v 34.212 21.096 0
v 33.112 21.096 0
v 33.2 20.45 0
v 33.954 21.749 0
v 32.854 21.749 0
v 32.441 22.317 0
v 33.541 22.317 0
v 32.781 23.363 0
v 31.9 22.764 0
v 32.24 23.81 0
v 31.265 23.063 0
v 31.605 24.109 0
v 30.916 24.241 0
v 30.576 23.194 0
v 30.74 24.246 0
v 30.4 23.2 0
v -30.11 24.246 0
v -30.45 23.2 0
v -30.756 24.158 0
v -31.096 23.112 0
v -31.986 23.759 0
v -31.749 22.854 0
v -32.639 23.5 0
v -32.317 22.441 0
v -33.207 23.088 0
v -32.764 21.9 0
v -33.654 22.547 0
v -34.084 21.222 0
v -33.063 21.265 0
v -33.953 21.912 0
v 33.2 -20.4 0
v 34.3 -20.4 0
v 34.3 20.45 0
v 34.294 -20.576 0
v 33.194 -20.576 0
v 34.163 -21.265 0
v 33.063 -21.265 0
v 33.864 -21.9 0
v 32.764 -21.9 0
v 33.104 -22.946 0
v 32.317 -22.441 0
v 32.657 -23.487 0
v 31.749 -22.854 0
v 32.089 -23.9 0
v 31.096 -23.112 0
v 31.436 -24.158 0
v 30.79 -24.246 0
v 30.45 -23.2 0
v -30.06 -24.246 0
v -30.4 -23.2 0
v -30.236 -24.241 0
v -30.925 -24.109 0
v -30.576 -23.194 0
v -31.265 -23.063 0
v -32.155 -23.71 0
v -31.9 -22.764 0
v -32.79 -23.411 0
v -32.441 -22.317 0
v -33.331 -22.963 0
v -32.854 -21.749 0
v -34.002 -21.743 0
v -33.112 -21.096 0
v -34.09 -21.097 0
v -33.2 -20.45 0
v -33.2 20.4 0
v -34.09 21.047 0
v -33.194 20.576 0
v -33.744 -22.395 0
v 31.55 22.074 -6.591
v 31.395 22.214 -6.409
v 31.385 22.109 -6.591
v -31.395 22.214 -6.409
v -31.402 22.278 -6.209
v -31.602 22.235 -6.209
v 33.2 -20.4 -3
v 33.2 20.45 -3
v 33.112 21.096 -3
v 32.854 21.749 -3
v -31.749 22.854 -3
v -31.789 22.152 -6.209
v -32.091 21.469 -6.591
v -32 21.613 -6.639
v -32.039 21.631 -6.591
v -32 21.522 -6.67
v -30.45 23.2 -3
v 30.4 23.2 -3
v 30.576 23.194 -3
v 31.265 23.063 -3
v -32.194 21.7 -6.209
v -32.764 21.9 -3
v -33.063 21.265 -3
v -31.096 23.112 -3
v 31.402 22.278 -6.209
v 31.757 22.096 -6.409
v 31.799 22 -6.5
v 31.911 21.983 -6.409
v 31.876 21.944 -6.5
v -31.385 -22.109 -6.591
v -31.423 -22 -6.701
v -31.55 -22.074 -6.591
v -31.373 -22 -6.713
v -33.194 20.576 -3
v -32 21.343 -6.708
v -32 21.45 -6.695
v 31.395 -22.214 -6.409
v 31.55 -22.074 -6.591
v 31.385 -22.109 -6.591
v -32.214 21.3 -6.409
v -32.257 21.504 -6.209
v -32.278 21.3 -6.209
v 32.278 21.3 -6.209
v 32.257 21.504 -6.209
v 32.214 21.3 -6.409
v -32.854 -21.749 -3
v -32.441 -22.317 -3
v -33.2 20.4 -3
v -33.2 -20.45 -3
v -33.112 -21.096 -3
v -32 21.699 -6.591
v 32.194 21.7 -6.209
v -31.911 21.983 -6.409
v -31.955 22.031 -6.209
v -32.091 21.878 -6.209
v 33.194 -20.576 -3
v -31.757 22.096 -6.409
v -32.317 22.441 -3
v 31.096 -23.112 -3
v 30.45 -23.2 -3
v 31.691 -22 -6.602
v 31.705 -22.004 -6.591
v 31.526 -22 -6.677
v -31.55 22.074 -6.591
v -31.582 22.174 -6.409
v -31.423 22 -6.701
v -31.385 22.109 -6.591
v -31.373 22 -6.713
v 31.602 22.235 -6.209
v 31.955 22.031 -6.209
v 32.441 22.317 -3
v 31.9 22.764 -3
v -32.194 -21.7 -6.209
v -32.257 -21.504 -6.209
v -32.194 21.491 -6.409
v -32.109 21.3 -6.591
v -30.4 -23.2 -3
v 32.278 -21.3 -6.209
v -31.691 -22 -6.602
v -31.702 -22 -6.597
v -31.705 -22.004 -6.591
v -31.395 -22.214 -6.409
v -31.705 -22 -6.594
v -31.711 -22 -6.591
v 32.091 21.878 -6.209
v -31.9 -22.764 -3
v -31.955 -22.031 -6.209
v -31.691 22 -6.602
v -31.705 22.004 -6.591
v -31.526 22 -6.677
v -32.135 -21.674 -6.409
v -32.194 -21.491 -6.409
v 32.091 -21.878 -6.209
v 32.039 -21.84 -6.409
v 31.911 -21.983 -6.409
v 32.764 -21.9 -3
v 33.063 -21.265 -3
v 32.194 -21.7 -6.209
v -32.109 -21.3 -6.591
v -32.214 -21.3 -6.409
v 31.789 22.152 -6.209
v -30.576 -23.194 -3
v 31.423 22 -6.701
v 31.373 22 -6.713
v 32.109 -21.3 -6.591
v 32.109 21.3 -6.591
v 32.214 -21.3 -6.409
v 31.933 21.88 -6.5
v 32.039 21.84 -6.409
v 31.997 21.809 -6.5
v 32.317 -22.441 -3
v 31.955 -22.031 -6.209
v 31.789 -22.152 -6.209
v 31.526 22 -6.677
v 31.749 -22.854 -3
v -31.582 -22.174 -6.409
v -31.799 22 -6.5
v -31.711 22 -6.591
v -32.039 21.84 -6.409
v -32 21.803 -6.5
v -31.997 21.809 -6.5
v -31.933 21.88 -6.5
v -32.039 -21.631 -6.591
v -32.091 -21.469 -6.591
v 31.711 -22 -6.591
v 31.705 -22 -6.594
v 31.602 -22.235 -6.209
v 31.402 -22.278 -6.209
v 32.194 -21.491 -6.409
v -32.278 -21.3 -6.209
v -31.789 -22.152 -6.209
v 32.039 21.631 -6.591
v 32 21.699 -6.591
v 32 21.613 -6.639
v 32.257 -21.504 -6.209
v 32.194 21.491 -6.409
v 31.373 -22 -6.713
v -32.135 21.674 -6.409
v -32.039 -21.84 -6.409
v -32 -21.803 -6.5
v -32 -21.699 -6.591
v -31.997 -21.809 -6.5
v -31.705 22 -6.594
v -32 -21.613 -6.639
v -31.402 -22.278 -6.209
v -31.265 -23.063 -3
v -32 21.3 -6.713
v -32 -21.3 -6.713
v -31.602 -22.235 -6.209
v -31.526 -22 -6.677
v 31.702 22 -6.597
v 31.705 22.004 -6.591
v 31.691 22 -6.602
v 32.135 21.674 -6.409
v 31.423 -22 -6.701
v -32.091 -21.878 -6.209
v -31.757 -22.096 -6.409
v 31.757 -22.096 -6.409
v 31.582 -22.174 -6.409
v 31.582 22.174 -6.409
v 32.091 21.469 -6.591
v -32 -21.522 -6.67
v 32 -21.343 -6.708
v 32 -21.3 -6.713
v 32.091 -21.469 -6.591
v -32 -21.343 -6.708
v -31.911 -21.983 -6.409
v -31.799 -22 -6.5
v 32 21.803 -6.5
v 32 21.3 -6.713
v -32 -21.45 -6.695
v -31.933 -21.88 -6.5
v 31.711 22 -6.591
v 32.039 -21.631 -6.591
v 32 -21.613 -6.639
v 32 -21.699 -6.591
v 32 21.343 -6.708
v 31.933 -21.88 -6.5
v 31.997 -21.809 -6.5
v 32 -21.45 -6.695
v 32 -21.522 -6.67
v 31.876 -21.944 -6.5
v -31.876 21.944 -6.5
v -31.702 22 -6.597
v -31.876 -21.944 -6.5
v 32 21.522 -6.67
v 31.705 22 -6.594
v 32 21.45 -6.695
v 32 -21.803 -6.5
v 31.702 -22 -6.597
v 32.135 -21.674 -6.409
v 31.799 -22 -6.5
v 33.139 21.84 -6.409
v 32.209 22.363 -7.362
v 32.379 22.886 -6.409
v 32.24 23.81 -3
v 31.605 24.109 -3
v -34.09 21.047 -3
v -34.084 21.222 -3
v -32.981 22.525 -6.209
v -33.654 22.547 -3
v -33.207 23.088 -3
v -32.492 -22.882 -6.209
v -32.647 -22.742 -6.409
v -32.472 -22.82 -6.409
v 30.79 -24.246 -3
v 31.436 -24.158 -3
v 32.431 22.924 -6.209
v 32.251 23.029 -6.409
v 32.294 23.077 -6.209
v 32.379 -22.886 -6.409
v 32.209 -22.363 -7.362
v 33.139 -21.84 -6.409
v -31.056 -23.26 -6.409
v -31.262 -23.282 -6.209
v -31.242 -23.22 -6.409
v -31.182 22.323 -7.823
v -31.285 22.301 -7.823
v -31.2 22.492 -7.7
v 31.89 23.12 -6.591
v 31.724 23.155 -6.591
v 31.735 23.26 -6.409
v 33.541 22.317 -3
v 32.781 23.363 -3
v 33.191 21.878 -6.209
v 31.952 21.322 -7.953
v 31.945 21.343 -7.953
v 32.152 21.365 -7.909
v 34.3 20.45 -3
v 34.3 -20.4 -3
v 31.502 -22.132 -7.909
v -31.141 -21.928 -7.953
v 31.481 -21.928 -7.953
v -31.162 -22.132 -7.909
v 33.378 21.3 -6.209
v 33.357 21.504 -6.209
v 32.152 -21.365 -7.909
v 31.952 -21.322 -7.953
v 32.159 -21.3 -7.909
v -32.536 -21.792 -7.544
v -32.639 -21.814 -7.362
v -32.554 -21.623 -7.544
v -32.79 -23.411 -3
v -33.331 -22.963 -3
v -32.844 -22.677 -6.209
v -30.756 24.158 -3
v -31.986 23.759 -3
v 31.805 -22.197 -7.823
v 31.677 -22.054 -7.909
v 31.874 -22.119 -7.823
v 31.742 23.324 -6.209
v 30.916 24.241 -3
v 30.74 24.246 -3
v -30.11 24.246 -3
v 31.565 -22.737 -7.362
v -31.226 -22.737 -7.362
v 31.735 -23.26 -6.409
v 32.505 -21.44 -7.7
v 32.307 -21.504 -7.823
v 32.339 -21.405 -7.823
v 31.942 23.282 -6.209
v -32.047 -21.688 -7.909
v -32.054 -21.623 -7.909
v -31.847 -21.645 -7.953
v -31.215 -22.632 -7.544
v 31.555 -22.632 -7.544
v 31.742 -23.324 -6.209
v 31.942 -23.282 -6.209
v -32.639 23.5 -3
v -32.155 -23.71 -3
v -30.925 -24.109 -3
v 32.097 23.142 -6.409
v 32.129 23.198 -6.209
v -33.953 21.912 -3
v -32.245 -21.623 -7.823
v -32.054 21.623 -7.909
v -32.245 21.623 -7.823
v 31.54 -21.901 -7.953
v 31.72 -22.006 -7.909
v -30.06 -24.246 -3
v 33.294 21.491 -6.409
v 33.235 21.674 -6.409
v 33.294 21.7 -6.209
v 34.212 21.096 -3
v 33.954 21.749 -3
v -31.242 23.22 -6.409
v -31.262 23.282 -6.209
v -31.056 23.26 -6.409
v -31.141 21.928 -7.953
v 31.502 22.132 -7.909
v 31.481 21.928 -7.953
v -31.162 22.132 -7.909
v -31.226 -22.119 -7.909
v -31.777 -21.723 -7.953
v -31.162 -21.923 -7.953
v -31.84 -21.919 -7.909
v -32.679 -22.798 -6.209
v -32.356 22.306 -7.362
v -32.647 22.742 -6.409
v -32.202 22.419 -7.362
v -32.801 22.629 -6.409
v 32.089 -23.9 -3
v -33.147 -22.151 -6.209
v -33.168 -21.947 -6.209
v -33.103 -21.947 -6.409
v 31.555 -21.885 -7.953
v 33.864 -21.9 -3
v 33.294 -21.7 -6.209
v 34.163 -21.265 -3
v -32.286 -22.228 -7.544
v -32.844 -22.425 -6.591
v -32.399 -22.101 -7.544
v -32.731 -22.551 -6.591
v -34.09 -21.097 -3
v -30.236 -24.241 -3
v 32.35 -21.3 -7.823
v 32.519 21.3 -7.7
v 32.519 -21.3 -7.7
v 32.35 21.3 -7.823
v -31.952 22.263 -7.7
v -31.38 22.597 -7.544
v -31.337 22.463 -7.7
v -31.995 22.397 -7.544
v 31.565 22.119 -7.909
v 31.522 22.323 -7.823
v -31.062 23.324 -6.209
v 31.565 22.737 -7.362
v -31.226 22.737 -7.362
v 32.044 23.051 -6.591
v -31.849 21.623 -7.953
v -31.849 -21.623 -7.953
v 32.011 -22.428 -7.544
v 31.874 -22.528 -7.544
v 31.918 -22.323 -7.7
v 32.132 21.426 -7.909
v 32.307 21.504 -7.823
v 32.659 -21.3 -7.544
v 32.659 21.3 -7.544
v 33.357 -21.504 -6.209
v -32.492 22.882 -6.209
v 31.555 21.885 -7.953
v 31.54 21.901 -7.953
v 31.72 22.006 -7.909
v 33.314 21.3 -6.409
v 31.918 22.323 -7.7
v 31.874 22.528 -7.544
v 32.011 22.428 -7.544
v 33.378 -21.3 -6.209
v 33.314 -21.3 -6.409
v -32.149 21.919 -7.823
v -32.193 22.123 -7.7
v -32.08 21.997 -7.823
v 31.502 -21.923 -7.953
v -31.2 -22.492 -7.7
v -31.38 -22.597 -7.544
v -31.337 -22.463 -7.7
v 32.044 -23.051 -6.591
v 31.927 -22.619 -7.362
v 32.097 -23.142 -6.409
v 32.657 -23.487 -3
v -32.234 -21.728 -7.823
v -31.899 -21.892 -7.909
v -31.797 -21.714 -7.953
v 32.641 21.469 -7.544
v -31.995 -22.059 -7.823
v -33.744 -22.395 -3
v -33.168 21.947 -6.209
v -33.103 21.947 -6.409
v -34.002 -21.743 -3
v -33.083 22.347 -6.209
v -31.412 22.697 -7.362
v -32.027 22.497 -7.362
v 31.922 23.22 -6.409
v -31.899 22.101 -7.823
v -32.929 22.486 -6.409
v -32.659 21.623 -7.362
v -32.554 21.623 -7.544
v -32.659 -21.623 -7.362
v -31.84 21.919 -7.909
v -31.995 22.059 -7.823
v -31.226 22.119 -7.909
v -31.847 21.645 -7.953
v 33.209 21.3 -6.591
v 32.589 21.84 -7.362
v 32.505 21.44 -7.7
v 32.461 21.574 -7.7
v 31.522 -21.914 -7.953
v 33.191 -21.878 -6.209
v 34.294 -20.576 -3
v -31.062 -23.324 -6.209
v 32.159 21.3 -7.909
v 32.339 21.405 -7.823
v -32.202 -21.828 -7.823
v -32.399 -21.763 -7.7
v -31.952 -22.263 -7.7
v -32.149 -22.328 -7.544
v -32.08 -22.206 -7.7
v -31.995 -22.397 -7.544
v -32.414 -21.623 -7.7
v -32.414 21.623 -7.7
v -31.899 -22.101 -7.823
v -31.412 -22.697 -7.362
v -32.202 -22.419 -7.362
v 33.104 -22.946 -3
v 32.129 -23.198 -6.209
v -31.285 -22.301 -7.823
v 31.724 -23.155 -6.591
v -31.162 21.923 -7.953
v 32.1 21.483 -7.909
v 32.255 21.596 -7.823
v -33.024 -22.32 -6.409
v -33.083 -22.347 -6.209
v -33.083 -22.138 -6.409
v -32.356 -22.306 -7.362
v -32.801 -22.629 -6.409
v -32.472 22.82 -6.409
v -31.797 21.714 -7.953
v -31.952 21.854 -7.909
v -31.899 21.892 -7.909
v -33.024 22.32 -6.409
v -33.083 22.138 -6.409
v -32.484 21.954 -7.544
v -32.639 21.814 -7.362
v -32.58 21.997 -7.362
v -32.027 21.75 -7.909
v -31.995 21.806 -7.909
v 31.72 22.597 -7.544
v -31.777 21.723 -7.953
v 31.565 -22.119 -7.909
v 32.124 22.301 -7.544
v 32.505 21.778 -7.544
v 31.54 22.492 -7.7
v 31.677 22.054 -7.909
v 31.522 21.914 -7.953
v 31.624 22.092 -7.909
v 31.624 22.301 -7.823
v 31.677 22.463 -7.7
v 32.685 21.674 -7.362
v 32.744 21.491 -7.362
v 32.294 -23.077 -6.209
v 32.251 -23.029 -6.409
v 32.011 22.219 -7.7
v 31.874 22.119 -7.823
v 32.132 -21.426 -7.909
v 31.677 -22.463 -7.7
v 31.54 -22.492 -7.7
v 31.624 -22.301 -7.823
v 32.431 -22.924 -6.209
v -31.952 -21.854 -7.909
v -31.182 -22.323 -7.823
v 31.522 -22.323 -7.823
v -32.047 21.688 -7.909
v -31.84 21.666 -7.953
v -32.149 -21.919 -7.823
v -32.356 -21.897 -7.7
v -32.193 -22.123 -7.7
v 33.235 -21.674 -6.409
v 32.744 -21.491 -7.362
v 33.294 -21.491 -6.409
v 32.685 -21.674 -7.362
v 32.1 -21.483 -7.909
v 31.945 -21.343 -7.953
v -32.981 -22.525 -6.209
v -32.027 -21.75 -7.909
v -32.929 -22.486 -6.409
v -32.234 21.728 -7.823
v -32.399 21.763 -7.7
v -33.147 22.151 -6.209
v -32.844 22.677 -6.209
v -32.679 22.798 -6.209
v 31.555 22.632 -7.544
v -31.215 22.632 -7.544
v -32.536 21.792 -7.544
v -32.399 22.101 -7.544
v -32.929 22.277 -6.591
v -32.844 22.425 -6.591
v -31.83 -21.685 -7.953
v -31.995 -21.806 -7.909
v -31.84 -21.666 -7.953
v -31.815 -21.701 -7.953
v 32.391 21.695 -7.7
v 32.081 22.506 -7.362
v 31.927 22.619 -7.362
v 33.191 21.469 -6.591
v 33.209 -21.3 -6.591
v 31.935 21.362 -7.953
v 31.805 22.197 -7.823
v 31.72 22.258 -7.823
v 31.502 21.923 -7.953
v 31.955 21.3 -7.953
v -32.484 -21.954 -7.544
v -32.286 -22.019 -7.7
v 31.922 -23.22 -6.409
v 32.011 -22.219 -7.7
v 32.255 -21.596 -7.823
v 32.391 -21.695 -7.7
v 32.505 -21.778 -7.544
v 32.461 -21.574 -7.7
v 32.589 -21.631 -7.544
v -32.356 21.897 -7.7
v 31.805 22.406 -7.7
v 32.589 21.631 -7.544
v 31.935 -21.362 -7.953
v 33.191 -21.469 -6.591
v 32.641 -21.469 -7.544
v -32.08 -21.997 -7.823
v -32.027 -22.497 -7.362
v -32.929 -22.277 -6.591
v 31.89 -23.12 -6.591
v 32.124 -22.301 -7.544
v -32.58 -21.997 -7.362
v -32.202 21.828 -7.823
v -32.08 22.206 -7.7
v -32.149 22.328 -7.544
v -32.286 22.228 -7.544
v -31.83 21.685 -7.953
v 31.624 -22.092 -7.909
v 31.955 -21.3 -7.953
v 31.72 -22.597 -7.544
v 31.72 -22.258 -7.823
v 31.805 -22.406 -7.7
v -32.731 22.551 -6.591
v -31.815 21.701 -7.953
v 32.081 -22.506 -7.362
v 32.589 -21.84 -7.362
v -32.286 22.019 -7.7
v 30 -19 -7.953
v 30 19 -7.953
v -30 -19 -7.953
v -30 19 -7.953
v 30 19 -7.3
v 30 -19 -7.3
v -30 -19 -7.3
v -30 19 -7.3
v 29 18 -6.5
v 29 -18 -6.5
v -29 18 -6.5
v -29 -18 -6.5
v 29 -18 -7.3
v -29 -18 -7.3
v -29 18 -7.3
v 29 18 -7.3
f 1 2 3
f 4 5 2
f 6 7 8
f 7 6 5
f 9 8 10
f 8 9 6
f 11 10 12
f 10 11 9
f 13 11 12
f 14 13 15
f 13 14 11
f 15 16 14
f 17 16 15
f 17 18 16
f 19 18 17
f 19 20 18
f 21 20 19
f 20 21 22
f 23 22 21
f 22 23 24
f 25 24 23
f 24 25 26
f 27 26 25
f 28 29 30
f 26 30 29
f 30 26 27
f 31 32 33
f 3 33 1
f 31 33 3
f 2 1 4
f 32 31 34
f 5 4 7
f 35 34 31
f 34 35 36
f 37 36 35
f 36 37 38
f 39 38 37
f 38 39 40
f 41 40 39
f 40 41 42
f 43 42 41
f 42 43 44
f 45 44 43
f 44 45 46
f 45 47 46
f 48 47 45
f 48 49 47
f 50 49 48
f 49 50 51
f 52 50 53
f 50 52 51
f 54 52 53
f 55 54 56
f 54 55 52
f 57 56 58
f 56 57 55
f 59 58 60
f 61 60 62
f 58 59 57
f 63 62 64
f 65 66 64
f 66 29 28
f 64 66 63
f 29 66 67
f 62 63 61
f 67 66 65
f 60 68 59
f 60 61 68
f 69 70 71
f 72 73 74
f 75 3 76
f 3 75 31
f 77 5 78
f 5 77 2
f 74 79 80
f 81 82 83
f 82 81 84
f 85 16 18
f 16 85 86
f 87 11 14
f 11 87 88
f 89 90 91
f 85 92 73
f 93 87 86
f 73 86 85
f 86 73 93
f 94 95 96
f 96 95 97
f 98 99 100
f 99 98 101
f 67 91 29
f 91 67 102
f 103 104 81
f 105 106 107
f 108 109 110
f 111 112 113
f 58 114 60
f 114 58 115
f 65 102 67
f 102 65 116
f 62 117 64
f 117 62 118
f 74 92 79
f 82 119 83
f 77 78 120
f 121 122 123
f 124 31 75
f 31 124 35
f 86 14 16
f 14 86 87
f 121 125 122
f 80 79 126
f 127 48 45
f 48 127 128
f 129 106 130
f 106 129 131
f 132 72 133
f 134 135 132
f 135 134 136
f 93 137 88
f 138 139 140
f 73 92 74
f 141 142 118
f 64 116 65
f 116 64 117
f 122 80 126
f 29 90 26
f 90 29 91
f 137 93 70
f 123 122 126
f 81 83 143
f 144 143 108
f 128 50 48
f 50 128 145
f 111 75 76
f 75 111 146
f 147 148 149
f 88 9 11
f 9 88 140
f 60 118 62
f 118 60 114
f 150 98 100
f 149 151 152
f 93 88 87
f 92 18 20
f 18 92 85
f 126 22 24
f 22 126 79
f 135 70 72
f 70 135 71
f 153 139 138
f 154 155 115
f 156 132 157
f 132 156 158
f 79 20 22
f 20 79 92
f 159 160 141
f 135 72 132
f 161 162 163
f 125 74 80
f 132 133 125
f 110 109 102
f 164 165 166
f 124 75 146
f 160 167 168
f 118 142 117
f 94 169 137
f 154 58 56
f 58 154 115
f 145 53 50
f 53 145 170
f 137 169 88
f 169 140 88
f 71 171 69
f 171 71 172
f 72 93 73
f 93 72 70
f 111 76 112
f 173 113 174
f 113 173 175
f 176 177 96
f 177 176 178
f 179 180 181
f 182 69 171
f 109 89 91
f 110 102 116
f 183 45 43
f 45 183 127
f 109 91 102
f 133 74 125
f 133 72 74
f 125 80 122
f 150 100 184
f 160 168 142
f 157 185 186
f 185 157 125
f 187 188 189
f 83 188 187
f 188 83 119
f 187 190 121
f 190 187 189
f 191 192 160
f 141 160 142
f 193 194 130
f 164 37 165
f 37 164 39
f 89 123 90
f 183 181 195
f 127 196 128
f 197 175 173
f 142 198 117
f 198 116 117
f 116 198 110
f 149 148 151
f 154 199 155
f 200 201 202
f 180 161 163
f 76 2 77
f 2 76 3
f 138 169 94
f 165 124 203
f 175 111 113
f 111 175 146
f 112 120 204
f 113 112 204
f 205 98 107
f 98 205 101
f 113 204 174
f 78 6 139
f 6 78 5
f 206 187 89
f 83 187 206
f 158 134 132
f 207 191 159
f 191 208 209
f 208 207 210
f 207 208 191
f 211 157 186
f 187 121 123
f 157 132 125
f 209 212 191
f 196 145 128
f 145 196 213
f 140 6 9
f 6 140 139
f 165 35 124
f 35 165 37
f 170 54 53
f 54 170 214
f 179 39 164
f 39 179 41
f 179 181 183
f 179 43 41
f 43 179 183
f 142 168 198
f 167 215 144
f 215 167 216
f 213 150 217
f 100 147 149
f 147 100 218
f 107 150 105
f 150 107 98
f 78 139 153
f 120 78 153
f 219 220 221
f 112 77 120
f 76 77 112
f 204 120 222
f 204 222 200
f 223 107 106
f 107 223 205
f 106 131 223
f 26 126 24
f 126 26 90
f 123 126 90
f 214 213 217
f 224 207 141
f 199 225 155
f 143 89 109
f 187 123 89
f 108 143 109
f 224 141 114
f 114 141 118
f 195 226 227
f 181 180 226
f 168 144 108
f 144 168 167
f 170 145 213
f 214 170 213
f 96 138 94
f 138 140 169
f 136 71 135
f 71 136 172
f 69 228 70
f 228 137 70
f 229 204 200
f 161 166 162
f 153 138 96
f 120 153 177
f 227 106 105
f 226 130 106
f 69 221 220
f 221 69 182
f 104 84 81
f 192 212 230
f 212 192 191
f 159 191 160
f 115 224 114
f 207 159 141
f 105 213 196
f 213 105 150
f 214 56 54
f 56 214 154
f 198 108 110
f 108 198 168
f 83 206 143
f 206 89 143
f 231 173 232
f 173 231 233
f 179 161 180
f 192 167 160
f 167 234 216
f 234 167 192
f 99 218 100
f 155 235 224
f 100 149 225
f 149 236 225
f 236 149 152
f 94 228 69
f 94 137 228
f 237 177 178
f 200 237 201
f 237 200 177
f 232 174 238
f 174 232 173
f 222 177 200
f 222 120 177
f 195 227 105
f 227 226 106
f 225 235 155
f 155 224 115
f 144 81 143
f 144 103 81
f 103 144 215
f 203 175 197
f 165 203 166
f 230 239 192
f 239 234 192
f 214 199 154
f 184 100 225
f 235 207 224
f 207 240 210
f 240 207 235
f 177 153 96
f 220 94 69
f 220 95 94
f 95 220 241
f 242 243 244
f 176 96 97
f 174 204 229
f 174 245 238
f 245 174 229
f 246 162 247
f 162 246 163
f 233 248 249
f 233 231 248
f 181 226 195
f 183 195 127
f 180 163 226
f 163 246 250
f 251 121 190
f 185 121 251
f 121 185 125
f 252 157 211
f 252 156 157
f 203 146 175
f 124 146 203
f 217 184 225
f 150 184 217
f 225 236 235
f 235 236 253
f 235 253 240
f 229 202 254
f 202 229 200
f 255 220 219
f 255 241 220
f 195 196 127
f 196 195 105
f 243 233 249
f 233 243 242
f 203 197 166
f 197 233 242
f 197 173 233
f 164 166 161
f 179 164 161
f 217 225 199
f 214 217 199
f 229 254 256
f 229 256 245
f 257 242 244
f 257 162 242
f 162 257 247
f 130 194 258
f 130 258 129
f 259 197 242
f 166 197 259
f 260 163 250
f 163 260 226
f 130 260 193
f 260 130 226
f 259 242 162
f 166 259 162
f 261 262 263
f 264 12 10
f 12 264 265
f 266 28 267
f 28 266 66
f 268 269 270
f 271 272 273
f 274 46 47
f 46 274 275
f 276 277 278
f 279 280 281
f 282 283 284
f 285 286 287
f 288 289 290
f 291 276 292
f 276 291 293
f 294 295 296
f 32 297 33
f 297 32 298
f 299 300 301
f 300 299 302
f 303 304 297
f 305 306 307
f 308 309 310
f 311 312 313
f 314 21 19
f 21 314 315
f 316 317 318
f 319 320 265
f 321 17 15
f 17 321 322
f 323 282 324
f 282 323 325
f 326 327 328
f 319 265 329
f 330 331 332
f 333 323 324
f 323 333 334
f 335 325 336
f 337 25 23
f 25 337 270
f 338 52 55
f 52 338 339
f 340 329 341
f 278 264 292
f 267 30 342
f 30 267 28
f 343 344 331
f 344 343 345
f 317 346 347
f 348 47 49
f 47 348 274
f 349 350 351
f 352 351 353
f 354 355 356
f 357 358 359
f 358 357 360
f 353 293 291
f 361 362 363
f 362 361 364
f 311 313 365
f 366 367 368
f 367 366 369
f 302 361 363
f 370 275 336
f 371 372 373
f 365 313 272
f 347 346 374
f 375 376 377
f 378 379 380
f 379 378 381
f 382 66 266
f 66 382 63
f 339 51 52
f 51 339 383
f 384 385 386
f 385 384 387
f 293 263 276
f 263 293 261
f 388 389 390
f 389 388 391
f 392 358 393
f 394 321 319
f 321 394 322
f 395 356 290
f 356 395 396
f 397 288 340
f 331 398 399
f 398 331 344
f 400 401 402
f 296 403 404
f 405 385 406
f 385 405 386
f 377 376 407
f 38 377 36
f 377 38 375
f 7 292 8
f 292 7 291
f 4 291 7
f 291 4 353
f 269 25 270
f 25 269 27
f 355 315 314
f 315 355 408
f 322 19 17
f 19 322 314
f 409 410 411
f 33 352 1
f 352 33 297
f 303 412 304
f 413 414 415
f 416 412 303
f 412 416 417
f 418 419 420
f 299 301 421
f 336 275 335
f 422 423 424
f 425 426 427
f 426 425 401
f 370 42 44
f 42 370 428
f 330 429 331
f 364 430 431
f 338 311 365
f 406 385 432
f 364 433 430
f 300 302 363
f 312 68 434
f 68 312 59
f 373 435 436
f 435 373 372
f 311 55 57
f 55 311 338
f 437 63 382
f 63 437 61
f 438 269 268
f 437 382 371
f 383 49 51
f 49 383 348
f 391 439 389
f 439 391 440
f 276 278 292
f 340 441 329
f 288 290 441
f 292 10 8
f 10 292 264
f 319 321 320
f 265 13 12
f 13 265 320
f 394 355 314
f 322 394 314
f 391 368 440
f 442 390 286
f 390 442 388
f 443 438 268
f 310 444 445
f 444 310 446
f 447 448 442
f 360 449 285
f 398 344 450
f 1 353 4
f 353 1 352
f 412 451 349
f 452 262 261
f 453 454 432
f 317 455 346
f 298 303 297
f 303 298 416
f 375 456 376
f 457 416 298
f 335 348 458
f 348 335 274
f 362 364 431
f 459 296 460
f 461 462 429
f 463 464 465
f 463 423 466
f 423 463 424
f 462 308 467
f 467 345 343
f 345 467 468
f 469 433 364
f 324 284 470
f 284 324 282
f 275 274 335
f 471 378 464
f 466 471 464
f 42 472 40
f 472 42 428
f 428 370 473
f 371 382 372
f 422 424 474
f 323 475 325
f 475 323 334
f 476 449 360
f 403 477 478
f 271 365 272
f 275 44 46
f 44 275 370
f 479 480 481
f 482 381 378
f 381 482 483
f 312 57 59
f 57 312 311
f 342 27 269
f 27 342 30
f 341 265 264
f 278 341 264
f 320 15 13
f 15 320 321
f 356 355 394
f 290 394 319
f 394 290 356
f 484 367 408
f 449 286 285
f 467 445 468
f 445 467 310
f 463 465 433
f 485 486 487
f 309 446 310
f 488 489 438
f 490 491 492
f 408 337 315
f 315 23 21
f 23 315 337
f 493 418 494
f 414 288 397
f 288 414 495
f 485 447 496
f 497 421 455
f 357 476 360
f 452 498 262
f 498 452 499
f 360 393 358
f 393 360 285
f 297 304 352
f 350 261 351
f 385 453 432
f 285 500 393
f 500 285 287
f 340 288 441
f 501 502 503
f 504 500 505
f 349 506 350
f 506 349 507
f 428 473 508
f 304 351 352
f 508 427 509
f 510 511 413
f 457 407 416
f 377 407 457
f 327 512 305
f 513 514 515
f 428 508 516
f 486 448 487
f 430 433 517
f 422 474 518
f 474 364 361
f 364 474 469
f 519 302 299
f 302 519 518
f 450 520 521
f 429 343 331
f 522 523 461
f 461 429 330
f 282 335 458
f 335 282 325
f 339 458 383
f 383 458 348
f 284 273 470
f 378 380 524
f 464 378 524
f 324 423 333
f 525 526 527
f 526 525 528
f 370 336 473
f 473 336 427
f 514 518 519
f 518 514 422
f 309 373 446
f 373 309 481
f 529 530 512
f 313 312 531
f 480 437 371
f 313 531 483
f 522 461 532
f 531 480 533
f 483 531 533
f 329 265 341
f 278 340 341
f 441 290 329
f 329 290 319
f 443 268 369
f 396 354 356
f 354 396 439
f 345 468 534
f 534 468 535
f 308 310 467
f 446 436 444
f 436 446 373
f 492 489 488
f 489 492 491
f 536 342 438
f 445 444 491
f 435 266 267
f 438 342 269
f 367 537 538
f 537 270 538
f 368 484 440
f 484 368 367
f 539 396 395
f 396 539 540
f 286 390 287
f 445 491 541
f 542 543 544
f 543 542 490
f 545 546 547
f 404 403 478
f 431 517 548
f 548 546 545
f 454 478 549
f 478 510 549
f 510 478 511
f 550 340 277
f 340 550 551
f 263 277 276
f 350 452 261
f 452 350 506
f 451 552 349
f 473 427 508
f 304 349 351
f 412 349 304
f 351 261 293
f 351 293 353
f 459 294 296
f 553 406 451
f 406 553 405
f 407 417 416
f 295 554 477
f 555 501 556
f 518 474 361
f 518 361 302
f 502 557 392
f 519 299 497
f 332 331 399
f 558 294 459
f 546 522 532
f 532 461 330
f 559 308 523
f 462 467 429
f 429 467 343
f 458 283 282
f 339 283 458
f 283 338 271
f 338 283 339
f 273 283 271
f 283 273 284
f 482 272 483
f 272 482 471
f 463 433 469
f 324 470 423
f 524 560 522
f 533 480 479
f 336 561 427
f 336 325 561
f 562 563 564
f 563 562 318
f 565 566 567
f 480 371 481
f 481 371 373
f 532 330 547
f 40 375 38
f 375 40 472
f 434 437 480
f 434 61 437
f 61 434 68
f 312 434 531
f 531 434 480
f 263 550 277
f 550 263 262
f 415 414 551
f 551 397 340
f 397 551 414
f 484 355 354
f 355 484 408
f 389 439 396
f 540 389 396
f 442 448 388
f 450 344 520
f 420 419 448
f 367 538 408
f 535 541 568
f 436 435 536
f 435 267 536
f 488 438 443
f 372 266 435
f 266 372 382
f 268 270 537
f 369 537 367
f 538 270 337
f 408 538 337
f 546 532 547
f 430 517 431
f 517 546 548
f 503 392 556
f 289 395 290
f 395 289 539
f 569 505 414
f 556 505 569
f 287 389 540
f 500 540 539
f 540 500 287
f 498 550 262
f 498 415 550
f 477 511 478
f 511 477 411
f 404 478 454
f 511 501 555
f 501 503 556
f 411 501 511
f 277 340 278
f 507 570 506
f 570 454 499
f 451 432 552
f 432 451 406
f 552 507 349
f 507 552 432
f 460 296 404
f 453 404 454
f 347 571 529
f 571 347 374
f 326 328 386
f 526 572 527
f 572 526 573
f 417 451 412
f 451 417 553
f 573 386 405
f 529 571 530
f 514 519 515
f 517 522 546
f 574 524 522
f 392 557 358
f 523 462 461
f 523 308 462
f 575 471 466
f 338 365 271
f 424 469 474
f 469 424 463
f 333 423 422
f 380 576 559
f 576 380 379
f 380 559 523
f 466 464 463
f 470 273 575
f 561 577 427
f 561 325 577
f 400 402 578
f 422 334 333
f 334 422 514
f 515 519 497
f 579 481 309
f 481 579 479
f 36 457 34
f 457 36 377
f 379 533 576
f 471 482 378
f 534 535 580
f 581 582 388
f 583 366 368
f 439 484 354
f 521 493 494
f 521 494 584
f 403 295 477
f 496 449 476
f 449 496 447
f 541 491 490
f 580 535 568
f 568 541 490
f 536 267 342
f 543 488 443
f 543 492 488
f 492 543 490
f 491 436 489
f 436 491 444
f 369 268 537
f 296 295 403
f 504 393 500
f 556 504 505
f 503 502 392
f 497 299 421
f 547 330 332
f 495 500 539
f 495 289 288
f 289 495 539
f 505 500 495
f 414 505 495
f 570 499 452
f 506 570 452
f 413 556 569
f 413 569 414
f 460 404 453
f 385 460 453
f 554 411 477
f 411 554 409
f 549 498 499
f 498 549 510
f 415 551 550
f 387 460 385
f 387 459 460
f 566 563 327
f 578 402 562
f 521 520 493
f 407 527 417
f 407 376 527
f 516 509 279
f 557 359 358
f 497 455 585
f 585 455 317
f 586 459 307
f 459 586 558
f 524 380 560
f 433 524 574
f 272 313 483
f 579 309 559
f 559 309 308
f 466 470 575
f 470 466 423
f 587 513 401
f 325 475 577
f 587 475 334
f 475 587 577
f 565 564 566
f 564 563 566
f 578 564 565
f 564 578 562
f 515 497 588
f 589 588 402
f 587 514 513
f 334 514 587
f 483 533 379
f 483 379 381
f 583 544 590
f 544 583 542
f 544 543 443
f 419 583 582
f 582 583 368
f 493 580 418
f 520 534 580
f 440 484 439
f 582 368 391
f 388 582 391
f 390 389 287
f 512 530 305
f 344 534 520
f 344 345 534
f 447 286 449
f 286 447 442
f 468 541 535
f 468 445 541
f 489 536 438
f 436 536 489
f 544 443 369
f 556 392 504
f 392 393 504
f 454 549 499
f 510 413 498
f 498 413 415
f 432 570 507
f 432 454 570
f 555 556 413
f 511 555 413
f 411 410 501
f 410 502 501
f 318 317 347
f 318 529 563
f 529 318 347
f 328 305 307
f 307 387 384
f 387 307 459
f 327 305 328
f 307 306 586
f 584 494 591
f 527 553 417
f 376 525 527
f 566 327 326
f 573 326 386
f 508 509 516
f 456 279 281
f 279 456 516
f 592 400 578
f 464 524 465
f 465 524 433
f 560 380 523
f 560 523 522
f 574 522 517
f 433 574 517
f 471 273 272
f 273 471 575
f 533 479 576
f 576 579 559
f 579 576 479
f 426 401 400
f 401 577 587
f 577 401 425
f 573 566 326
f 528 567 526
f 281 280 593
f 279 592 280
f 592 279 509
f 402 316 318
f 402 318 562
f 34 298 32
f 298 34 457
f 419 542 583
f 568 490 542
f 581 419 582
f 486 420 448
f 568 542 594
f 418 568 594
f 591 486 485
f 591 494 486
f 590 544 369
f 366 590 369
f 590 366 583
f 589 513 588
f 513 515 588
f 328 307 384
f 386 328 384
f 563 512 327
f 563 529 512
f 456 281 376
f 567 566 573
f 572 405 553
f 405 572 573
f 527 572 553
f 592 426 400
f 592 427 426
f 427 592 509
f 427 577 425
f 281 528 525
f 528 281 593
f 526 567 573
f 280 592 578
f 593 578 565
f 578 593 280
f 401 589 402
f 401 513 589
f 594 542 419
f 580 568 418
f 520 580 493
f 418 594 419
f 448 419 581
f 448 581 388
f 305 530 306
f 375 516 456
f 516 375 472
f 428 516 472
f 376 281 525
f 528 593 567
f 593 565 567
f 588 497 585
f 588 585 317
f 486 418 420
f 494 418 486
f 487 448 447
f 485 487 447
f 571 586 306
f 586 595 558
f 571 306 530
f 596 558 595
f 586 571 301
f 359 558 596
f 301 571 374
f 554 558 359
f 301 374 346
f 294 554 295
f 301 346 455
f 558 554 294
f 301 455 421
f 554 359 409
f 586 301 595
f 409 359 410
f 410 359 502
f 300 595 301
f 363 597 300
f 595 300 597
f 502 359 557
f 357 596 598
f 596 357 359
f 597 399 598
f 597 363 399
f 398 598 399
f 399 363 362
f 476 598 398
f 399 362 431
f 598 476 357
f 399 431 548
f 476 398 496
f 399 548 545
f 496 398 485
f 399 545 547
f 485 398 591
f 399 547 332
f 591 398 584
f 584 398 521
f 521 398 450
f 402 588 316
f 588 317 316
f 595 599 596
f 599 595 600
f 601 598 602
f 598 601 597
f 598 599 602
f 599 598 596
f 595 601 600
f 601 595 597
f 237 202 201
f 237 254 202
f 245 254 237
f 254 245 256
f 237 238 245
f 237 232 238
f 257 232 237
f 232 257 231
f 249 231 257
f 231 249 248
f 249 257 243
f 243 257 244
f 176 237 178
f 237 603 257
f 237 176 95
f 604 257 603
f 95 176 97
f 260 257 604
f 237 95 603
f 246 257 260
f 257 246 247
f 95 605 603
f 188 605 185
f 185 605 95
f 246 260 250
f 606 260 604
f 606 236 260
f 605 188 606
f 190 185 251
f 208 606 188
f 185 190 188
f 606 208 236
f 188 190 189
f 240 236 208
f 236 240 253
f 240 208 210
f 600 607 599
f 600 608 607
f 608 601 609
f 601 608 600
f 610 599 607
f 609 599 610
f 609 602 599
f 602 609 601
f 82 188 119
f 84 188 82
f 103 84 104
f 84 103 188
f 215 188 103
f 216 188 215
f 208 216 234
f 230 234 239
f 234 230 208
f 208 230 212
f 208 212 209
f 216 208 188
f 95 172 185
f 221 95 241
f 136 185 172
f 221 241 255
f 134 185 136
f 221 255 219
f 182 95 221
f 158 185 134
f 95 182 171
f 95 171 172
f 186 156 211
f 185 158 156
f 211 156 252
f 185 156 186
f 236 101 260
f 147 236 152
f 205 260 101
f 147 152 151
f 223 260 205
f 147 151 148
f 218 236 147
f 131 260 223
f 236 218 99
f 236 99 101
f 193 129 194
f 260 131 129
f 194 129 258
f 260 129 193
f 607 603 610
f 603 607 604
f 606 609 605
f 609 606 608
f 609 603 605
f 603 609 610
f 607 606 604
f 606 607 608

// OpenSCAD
epaisseur1=1.4;
radius=epaisseur1;
marge = 0.3;
xc=63;
yc=43;
zecran=6.0;
xb=xc+2*epaisseur1+2*marge;
yb=yc+2*epaisseur1+2*marge;
offset=0.2;
//voffset = .75;
rebord = 3.5;
epaisseur=1.1;
marge_ba=1.2;
hecran=64;
lecran=46;


difference () {

// coque de base
minkowski () {
    
//union () {
// cube de coque (ecran)
hull() {
    
// cube de coque (ecran)
hull () {
translate([-xc/2+offset,yc/2-offset,-zecran])
resize(newsize=[2,2,2])
sphere(r=120);
    
translate([xc/2-offset,yc/2-offset,-zecran])
resize(newsize=[2,2,2])
sphere(r=120);
    
translate([-xc/2+offset,-yc/2+offset,-zecran])
resize(newsize=[2,2,2])
sphere(r=120);
    
translate([xc/2-offset,-yc/2+offset,-zecran])
resize(newsize=[2,2,2])
sphere(r=120);

translate([0,0,(rebord+2) / 2-3])
roundCornersCube(xb,yb,(rebord+2),radius+epaisseur1);
}

// socle ecran
//translate([0,0,rebord / 2])
//roundCornersCube(xb,yb,rebord,radius+epaisseur1);

}



//}
sphere(epaisseur, center = true);
}

// ceci est la box inferieure (exterieur)
translate([0,0,25])
roundCornersCube(xb,yb,50,radius+epaisseur1);

// ceci est l'ecran
translate([0,0,-2])
cube([60, 38, 100], center = true);



union () {
hull() {
    
translate([-xc/2+offset,yc/2-offset,-zecran])
resize(newsize=[2,2,2])
sphere(r=120);
    
translate([xc/2-offset,yc/2-offset,-zecran])
resize(newsize=[2,2,2])
sphere(r=120);
    
translate([-xc/2+offset,-yc/2+offset,-zecran])
resize(newsize=[2,2,2])
sphere(r=120);
    
translate([xc/2-offset,-yc/2+offset,-zecran])
resize(newsize=[2,2,2])
sphere(r=120);

translate([0,0,(rebord+2) / 2-3])
roundCornersCube(xb,yb,(rebord+2),radius+epaisseur1);
    
}

translate([0,0,50])
cube([100, 100, 100], center = true);
}

}

difference () {
    
// ceci est l'ecran
translate([0,0,-zecran - epaisseur + 0.2])
cube([64, 44, 0.8], center = true);
    
    
// ceci est l'ecran
translate([0,0,0])
cube([58, 36, 100], center = true);
    
}

/////////////////////////////////
/////////////////////////////////
/////////////////////////////////
/////////////////////////////////

module createMeniscus(h,radius) // This module creates the shape that needs to be substracted from a cube to make its corners rounded.
difference(){        //This shape is basicly the difference between a quarter of cylinder and a cube
   translate([radius/2+0.1,radius/2+0.1,0]){
      cube([radius+0.2,radius+0.1,h+0.2],center=true);         // All that 0.x numbers are to avoid "ghost boundaries" when substracting
   }

   cylinder(h=h+0.2,r=radius,$fn = 25,center=true);
}


module roundCornersCube(x,y,z,r)  // Now we just substract the shape we have created in the four corners
difference(){
   cube([x,y,z], center=true);

translate([x/2-r,y/2-r]){  // We move to the first corner (x,y)
      rotate(0){  
         createMeniscus(z,r); // And substract the meniscus
      }
   }
   translate([-x/2+r,y/2-r]){ // To the second corner (-x,y)
      rotate(90){
         createMeniscus(z,r); // But this time we have to rotate the meniscus 90 deg
      }
   }
      translate([-x/2+r,-y/2+r]){ // ... 
      rotate(180){
         createMeniscus(z,r);
      }
   }
      translate([x/2-r,-y/2+r]){
      rotate(270){
         createMeniscus(z,r);
      }
   }
}
